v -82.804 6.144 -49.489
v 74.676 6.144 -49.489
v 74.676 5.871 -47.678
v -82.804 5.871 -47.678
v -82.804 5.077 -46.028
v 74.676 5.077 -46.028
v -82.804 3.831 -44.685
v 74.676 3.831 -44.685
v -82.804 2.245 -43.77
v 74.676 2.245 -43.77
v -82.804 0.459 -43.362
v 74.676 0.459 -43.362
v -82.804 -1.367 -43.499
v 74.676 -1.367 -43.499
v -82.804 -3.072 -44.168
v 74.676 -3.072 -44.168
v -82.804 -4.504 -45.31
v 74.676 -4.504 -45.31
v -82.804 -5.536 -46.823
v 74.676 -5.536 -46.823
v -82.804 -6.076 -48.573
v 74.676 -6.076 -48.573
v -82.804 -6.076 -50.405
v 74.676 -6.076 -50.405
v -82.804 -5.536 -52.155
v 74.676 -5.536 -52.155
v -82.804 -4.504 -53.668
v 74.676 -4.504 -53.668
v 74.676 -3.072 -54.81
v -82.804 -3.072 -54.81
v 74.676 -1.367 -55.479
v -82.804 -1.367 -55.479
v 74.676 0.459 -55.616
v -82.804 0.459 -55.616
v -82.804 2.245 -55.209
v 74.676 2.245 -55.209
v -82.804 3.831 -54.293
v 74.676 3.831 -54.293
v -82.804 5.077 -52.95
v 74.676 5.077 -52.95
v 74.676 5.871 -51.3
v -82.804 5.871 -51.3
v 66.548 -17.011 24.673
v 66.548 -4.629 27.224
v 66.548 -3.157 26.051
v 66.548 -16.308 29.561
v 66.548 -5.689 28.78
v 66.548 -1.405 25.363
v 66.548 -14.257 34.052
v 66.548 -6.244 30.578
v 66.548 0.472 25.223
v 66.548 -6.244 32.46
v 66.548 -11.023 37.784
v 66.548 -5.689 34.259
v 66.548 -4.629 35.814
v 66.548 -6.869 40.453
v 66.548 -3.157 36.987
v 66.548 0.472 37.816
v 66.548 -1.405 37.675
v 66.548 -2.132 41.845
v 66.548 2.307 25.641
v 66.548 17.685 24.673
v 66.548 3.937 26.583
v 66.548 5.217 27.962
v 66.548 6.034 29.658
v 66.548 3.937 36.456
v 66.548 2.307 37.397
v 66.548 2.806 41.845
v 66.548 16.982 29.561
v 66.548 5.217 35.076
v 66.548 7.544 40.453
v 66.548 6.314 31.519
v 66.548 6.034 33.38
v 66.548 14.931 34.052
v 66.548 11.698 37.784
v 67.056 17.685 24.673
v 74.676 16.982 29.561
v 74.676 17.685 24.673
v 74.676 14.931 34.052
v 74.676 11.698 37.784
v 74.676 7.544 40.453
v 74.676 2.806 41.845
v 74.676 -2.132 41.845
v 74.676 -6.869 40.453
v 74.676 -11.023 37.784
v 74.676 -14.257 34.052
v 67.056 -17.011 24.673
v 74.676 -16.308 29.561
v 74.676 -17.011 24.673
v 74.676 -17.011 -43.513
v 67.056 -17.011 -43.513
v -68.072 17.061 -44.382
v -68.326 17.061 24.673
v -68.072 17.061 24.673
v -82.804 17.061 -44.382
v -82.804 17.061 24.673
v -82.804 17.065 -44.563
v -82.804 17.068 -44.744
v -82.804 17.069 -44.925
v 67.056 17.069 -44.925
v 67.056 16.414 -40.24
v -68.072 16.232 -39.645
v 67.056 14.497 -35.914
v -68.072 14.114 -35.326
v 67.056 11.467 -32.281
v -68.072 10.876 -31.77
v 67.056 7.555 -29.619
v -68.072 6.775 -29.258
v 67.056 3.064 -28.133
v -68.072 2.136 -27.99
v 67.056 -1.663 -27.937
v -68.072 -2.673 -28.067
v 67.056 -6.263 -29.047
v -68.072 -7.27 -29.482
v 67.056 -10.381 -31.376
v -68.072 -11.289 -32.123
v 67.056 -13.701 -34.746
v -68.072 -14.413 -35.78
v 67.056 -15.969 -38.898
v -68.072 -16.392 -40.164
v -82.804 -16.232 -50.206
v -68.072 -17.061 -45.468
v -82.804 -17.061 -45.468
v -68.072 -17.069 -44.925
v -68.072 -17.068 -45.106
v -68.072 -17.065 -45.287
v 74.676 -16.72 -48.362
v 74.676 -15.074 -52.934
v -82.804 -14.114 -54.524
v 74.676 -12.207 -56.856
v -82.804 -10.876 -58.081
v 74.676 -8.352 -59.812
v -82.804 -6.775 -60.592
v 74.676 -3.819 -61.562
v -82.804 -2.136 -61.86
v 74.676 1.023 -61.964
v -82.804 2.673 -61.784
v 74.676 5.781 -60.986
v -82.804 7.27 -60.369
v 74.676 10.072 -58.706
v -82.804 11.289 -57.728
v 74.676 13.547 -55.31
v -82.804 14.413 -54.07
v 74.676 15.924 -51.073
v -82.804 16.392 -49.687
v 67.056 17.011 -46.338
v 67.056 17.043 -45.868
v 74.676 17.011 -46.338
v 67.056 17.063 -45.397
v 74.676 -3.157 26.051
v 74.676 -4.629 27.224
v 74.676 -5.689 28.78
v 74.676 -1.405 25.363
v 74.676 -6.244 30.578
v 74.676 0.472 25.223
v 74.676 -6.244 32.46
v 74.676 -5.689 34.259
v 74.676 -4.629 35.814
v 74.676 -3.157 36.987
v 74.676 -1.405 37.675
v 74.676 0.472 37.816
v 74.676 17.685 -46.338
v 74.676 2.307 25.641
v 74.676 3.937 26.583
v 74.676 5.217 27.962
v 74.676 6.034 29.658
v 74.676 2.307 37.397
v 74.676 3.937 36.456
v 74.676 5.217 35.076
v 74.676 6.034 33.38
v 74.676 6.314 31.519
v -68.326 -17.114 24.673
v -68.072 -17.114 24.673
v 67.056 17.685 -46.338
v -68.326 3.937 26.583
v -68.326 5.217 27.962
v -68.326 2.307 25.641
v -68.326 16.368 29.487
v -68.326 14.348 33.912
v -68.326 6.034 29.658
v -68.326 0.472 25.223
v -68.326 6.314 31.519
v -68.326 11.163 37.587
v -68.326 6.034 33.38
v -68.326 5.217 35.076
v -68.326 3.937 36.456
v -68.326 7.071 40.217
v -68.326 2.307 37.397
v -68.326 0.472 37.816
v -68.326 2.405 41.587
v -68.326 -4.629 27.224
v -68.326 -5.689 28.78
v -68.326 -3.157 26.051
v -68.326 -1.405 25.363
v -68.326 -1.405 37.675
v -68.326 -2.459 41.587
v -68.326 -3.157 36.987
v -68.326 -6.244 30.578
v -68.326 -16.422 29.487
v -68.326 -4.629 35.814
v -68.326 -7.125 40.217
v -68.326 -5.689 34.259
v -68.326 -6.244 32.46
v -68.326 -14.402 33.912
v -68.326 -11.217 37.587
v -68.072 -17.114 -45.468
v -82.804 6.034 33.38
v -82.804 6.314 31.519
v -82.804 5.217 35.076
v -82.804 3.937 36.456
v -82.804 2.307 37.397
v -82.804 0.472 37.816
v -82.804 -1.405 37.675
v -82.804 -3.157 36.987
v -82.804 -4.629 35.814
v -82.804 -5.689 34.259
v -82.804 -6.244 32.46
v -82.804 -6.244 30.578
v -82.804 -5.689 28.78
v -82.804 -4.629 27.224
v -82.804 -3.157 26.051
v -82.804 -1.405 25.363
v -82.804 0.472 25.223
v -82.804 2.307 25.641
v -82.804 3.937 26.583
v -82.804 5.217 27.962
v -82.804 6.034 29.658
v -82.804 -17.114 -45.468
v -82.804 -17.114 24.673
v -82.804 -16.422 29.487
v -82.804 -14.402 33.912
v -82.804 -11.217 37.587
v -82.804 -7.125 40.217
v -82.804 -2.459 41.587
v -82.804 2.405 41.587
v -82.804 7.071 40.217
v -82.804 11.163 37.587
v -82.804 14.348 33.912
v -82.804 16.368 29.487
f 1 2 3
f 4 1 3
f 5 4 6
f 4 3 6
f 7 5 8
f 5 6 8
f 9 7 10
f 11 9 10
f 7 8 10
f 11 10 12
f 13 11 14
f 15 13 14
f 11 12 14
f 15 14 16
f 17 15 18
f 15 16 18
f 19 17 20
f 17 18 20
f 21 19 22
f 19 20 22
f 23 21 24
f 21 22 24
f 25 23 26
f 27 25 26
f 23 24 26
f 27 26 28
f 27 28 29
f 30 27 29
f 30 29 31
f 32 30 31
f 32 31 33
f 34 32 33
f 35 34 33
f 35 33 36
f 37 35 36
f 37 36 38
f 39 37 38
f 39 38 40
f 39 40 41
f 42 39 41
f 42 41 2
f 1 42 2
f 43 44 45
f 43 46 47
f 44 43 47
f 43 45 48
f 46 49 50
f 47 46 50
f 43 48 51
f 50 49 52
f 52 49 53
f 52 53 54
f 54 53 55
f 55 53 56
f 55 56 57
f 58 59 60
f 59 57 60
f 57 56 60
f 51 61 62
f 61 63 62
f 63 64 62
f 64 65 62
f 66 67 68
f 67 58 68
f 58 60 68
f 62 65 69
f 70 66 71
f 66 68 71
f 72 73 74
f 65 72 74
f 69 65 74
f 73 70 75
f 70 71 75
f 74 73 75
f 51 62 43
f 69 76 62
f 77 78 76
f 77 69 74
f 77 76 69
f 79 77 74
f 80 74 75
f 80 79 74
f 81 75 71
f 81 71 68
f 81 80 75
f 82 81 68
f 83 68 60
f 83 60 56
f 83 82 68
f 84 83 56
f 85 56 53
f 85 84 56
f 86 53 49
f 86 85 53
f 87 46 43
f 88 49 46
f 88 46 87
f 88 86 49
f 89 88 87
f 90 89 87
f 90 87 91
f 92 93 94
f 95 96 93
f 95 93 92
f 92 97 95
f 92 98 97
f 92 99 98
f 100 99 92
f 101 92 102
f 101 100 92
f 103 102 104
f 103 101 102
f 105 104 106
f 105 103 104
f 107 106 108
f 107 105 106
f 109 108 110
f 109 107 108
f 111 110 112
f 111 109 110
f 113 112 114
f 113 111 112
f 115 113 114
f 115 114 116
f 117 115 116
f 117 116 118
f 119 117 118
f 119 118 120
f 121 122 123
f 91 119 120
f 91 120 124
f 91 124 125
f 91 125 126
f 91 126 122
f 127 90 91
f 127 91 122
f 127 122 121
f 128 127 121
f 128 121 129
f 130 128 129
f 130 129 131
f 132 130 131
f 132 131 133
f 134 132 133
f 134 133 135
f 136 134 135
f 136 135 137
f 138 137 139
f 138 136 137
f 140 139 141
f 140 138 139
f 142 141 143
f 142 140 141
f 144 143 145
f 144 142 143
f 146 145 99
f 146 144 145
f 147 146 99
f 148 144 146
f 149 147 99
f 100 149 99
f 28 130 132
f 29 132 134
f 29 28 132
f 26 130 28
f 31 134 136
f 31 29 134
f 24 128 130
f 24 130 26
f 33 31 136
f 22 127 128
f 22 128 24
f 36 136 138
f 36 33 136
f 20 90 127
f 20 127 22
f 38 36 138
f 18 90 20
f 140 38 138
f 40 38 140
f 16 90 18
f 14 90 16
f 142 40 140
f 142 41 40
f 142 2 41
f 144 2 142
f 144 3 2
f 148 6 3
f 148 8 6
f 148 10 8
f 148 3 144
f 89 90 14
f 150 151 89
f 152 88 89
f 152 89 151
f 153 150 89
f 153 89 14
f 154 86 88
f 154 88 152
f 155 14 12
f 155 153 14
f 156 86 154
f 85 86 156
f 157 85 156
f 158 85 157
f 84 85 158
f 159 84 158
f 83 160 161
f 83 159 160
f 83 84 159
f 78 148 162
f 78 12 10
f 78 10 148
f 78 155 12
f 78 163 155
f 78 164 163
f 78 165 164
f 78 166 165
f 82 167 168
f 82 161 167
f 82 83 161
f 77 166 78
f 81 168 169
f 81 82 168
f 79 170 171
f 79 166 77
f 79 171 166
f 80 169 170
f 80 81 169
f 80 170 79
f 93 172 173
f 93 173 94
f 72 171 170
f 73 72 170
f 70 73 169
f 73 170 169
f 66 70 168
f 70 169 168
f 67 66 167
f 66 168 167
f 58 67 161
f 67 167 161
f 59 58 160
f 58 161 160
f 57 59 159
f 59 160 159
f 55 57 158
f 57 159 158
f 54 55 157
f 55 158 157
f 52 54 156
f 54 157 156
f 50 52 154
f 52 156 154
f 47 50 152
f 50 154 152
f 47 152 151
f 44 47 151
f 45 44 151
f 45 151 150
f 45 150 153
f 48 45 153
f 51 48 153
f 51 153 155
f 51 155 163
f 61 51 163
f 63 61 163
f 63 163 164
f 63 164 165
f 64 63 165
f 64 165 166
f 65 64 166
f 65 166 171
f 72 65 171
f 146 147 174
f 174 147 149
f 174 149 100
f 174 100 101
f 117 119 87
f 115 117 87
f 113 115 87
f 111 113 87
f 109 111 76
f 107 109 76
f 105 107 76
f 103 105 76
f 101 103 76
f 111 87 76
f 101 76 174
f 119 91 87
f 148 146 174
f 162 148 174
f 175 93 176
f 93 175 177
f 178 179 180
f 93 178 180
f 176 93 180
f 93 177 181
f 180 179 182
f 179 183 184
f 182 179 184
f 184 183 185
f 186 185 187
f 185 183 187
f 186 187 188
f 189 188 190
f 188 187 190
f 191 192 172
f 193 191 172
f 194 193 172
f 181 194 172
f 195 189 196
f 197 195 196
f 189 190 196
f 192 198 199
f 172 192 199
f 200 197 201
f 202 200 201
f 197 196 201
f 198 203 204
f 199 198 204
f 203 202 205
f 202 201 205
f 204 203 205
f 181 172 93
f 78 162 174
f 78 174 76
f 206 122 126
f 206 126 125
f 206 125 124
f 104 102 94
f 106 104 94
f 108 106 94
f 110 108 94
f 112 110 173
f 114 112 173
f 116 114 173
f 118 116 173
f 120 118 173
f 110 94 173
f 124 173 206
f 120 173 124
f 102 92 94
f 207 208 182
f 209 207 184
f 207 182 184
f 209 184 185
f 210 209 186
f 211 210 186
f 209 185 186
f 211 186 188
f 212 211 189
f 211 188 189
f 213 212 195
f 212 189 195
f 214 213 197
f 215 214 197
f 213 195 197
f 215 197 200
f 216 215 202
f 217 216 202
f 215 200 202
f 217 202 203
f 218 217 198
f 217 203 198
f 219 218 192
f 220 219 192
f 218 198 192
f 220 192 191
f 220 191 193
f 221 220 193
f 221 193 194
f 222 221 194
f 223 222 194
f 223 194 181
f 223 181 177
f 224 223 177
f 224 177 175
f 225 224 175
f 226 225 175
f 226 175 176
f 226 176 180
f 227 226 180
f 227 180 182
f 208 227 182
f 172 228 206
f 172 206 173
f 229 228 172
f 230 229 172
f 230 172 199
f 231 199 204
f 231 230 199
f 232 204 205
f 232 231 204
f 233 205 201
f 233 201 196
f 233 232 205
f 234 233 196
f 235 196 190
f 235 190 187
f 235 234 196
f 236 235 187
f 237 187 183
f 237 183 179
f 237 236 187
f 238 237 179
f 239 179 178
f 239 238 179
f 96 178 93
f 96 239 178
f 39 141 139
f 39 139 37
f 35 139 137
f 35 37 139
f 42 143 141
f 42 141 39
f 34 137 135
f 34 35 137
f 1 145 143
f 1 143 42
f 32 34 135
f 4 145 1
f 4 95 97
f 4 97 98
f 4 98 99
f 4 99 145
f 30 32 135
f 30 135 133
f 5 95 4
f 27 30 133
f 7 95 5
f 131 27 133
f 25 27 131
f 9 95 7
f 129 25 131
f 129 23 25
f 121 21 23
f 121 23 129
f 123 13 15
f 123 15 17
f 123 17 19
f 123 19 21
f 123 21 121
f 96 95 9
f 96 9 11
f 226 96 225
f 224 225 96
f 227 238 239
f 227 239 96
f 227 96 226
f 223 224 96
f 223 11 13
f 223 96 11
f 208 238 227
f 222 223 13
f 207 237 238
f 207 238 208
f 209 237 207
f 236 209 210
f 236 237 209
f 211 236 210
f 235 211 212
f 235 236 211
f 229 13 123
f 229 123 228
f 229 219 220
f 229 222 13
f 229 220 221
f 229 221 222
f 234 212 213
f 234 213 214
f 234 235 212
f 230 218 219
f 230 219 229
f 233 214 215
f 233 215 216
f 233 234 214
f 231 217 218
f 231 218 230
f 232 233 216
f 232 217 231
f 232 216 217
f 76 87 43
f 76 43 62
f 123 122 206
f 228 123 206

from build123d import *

# Parameters (mm, degrees)
F0_R       = 17.0692141661
F1_DEPTH   = 74.676
F3_DEPTH   = 7.62
F1_FACE1_R = 17.0692141661
F5_DEPTH   = 8.128
F7_DEPTH   = 14.732
F9_DEPTH   = 14.478
F10_R      = 6.1442753349
F11_DEPTH  = 157.481
F12_R      = 6.3140721671
F13_DEPTH  = 157.481


with BuildPart() as f1:
    # F0 (on Right) → F1 (new body, symmetric)
    with BuildSketch(Plane.YZ):
        with Locations((0, -44.9254028499)):
            Circle(F0_R)
    extrude(amount=F1_DEPTH, both=True)

    # F2 (on face) → F3 (join)
    with BuildSketch(Plane.YZ.offset(74.676)):
        with BuildLine():
            ThreePointArc((17.0692141661, -44.9254028499), (17.054567773, -45.6323613518), (17.0106537288, -46.3381066294))
            Line((17.0106537288, -46.3381066294), (17.6849197596, -46.3381066294))
            Line((17.6849197596, -46.3381066294), (17.6849197596, 24.6733147651))
            Line((17.6849197596, 24.6733147651), (-17.0106537288, 24.6733147651))
            Line((-17.0106537288, 24.6733147651), (-17.0106537288, -43.5126990704))
            ThreePointArc((-17.0106537288, -43.5126990704), (0.7069585019, -27.8708350769), (17.0692141661, -44.9254028499))
        make_face()
    extrude(amount=-F3_DEPTH)

    # F4 (on face) + F1_face1 (on face) → F5 (join)
    with BuildSketch(Plane.YZ.offset(74.676)):
        with BuildLine():
            Line((-17.0106537288, 24.6733147651), (17.6849197596, 24.6733147651))
            ThreePointArc((17.6849197596, 24.6733147651), (0.3371330154, 42.0211015093), (-17.0106537288, 24.6733147651))
        make_face()
    with BuildSketch(Plane(origin=(-74.676, 0, -44.9254028499), x_dir=(0, 1, 0), z_dir=(-1, 0, 0))):
        Circle(F1_FACE1_R)
    extrude(amount=-F5_DEPTH, dir=(1, 0, 0))

    # F6 (on face) → F7 (join)
    with BuildSketch(Plane(origin=(-82.804, 0, 0), x_dir=(0, -1, 0), z_dir=(-1, 0, 0))):
        with BuildLine():
            ThreePointArc((17.0692141661, -44.9254028499), (17.0670540007, -45.1969539267), (17.060574051, -45.4684362721))
            Line((17.060574051, -45.4684362721), (17.1144399792, -45.4684362721))
            Line((17.1144399792, -45.4684362721), (17.1144399792, 24.6733147651))
            Line((17.1144399792, 24.6733147651), (-17.060574051, 24.6733147651))
            Line((-17.060574051, 24.6733147651), (-17.060574051, -44.3823694277))
            ThreePointArc((-17.060574051, -44.3823694277), (0.2715510768, -27.8583488493), (17.0692141661, -44.9254028499))
        make_face()
    extrude(amount=-F7_DEPTH)

    # F8 (on face) → F9 (join)
    with BuildSketch(Plane(origin=(-82.804, 0, 0), x_dir=(0, -1, 0), z_dir=(-1, 0, 0))):
        with BuildLine():
            Line((-17.060574051, 24.6733147651), (17.1144399792, 24.6733147651))
            ThreePointArc((17.1144399792, 24.6733147651), (0.0269329641, 41.7608217802), (-17.060574051, 24.6733147651))
        make_face()
    extrude(amount=-F9_DEPTH)

    # F10 (on face) → F11 (cut, through all)
    with BuildSketch(Plane.YZ.offset(74.676)):
        with Locations((0, -49.4892522693)):
            Circle(F10_R)
    extrude(amount=-F11_DEPTH, mode=Mode.SUBTRACT)

    # F12 (on face) → F13 (cut, through all)
    with BuildSketch(Plane.YZ.offset(74.676)):
        with Locations((0, 31.5190926194)):
            Circle(F12_R)
    extrude(amount=-F13_DEPTH, mode=Mode.SUBTRACT)


solid = f1.part
